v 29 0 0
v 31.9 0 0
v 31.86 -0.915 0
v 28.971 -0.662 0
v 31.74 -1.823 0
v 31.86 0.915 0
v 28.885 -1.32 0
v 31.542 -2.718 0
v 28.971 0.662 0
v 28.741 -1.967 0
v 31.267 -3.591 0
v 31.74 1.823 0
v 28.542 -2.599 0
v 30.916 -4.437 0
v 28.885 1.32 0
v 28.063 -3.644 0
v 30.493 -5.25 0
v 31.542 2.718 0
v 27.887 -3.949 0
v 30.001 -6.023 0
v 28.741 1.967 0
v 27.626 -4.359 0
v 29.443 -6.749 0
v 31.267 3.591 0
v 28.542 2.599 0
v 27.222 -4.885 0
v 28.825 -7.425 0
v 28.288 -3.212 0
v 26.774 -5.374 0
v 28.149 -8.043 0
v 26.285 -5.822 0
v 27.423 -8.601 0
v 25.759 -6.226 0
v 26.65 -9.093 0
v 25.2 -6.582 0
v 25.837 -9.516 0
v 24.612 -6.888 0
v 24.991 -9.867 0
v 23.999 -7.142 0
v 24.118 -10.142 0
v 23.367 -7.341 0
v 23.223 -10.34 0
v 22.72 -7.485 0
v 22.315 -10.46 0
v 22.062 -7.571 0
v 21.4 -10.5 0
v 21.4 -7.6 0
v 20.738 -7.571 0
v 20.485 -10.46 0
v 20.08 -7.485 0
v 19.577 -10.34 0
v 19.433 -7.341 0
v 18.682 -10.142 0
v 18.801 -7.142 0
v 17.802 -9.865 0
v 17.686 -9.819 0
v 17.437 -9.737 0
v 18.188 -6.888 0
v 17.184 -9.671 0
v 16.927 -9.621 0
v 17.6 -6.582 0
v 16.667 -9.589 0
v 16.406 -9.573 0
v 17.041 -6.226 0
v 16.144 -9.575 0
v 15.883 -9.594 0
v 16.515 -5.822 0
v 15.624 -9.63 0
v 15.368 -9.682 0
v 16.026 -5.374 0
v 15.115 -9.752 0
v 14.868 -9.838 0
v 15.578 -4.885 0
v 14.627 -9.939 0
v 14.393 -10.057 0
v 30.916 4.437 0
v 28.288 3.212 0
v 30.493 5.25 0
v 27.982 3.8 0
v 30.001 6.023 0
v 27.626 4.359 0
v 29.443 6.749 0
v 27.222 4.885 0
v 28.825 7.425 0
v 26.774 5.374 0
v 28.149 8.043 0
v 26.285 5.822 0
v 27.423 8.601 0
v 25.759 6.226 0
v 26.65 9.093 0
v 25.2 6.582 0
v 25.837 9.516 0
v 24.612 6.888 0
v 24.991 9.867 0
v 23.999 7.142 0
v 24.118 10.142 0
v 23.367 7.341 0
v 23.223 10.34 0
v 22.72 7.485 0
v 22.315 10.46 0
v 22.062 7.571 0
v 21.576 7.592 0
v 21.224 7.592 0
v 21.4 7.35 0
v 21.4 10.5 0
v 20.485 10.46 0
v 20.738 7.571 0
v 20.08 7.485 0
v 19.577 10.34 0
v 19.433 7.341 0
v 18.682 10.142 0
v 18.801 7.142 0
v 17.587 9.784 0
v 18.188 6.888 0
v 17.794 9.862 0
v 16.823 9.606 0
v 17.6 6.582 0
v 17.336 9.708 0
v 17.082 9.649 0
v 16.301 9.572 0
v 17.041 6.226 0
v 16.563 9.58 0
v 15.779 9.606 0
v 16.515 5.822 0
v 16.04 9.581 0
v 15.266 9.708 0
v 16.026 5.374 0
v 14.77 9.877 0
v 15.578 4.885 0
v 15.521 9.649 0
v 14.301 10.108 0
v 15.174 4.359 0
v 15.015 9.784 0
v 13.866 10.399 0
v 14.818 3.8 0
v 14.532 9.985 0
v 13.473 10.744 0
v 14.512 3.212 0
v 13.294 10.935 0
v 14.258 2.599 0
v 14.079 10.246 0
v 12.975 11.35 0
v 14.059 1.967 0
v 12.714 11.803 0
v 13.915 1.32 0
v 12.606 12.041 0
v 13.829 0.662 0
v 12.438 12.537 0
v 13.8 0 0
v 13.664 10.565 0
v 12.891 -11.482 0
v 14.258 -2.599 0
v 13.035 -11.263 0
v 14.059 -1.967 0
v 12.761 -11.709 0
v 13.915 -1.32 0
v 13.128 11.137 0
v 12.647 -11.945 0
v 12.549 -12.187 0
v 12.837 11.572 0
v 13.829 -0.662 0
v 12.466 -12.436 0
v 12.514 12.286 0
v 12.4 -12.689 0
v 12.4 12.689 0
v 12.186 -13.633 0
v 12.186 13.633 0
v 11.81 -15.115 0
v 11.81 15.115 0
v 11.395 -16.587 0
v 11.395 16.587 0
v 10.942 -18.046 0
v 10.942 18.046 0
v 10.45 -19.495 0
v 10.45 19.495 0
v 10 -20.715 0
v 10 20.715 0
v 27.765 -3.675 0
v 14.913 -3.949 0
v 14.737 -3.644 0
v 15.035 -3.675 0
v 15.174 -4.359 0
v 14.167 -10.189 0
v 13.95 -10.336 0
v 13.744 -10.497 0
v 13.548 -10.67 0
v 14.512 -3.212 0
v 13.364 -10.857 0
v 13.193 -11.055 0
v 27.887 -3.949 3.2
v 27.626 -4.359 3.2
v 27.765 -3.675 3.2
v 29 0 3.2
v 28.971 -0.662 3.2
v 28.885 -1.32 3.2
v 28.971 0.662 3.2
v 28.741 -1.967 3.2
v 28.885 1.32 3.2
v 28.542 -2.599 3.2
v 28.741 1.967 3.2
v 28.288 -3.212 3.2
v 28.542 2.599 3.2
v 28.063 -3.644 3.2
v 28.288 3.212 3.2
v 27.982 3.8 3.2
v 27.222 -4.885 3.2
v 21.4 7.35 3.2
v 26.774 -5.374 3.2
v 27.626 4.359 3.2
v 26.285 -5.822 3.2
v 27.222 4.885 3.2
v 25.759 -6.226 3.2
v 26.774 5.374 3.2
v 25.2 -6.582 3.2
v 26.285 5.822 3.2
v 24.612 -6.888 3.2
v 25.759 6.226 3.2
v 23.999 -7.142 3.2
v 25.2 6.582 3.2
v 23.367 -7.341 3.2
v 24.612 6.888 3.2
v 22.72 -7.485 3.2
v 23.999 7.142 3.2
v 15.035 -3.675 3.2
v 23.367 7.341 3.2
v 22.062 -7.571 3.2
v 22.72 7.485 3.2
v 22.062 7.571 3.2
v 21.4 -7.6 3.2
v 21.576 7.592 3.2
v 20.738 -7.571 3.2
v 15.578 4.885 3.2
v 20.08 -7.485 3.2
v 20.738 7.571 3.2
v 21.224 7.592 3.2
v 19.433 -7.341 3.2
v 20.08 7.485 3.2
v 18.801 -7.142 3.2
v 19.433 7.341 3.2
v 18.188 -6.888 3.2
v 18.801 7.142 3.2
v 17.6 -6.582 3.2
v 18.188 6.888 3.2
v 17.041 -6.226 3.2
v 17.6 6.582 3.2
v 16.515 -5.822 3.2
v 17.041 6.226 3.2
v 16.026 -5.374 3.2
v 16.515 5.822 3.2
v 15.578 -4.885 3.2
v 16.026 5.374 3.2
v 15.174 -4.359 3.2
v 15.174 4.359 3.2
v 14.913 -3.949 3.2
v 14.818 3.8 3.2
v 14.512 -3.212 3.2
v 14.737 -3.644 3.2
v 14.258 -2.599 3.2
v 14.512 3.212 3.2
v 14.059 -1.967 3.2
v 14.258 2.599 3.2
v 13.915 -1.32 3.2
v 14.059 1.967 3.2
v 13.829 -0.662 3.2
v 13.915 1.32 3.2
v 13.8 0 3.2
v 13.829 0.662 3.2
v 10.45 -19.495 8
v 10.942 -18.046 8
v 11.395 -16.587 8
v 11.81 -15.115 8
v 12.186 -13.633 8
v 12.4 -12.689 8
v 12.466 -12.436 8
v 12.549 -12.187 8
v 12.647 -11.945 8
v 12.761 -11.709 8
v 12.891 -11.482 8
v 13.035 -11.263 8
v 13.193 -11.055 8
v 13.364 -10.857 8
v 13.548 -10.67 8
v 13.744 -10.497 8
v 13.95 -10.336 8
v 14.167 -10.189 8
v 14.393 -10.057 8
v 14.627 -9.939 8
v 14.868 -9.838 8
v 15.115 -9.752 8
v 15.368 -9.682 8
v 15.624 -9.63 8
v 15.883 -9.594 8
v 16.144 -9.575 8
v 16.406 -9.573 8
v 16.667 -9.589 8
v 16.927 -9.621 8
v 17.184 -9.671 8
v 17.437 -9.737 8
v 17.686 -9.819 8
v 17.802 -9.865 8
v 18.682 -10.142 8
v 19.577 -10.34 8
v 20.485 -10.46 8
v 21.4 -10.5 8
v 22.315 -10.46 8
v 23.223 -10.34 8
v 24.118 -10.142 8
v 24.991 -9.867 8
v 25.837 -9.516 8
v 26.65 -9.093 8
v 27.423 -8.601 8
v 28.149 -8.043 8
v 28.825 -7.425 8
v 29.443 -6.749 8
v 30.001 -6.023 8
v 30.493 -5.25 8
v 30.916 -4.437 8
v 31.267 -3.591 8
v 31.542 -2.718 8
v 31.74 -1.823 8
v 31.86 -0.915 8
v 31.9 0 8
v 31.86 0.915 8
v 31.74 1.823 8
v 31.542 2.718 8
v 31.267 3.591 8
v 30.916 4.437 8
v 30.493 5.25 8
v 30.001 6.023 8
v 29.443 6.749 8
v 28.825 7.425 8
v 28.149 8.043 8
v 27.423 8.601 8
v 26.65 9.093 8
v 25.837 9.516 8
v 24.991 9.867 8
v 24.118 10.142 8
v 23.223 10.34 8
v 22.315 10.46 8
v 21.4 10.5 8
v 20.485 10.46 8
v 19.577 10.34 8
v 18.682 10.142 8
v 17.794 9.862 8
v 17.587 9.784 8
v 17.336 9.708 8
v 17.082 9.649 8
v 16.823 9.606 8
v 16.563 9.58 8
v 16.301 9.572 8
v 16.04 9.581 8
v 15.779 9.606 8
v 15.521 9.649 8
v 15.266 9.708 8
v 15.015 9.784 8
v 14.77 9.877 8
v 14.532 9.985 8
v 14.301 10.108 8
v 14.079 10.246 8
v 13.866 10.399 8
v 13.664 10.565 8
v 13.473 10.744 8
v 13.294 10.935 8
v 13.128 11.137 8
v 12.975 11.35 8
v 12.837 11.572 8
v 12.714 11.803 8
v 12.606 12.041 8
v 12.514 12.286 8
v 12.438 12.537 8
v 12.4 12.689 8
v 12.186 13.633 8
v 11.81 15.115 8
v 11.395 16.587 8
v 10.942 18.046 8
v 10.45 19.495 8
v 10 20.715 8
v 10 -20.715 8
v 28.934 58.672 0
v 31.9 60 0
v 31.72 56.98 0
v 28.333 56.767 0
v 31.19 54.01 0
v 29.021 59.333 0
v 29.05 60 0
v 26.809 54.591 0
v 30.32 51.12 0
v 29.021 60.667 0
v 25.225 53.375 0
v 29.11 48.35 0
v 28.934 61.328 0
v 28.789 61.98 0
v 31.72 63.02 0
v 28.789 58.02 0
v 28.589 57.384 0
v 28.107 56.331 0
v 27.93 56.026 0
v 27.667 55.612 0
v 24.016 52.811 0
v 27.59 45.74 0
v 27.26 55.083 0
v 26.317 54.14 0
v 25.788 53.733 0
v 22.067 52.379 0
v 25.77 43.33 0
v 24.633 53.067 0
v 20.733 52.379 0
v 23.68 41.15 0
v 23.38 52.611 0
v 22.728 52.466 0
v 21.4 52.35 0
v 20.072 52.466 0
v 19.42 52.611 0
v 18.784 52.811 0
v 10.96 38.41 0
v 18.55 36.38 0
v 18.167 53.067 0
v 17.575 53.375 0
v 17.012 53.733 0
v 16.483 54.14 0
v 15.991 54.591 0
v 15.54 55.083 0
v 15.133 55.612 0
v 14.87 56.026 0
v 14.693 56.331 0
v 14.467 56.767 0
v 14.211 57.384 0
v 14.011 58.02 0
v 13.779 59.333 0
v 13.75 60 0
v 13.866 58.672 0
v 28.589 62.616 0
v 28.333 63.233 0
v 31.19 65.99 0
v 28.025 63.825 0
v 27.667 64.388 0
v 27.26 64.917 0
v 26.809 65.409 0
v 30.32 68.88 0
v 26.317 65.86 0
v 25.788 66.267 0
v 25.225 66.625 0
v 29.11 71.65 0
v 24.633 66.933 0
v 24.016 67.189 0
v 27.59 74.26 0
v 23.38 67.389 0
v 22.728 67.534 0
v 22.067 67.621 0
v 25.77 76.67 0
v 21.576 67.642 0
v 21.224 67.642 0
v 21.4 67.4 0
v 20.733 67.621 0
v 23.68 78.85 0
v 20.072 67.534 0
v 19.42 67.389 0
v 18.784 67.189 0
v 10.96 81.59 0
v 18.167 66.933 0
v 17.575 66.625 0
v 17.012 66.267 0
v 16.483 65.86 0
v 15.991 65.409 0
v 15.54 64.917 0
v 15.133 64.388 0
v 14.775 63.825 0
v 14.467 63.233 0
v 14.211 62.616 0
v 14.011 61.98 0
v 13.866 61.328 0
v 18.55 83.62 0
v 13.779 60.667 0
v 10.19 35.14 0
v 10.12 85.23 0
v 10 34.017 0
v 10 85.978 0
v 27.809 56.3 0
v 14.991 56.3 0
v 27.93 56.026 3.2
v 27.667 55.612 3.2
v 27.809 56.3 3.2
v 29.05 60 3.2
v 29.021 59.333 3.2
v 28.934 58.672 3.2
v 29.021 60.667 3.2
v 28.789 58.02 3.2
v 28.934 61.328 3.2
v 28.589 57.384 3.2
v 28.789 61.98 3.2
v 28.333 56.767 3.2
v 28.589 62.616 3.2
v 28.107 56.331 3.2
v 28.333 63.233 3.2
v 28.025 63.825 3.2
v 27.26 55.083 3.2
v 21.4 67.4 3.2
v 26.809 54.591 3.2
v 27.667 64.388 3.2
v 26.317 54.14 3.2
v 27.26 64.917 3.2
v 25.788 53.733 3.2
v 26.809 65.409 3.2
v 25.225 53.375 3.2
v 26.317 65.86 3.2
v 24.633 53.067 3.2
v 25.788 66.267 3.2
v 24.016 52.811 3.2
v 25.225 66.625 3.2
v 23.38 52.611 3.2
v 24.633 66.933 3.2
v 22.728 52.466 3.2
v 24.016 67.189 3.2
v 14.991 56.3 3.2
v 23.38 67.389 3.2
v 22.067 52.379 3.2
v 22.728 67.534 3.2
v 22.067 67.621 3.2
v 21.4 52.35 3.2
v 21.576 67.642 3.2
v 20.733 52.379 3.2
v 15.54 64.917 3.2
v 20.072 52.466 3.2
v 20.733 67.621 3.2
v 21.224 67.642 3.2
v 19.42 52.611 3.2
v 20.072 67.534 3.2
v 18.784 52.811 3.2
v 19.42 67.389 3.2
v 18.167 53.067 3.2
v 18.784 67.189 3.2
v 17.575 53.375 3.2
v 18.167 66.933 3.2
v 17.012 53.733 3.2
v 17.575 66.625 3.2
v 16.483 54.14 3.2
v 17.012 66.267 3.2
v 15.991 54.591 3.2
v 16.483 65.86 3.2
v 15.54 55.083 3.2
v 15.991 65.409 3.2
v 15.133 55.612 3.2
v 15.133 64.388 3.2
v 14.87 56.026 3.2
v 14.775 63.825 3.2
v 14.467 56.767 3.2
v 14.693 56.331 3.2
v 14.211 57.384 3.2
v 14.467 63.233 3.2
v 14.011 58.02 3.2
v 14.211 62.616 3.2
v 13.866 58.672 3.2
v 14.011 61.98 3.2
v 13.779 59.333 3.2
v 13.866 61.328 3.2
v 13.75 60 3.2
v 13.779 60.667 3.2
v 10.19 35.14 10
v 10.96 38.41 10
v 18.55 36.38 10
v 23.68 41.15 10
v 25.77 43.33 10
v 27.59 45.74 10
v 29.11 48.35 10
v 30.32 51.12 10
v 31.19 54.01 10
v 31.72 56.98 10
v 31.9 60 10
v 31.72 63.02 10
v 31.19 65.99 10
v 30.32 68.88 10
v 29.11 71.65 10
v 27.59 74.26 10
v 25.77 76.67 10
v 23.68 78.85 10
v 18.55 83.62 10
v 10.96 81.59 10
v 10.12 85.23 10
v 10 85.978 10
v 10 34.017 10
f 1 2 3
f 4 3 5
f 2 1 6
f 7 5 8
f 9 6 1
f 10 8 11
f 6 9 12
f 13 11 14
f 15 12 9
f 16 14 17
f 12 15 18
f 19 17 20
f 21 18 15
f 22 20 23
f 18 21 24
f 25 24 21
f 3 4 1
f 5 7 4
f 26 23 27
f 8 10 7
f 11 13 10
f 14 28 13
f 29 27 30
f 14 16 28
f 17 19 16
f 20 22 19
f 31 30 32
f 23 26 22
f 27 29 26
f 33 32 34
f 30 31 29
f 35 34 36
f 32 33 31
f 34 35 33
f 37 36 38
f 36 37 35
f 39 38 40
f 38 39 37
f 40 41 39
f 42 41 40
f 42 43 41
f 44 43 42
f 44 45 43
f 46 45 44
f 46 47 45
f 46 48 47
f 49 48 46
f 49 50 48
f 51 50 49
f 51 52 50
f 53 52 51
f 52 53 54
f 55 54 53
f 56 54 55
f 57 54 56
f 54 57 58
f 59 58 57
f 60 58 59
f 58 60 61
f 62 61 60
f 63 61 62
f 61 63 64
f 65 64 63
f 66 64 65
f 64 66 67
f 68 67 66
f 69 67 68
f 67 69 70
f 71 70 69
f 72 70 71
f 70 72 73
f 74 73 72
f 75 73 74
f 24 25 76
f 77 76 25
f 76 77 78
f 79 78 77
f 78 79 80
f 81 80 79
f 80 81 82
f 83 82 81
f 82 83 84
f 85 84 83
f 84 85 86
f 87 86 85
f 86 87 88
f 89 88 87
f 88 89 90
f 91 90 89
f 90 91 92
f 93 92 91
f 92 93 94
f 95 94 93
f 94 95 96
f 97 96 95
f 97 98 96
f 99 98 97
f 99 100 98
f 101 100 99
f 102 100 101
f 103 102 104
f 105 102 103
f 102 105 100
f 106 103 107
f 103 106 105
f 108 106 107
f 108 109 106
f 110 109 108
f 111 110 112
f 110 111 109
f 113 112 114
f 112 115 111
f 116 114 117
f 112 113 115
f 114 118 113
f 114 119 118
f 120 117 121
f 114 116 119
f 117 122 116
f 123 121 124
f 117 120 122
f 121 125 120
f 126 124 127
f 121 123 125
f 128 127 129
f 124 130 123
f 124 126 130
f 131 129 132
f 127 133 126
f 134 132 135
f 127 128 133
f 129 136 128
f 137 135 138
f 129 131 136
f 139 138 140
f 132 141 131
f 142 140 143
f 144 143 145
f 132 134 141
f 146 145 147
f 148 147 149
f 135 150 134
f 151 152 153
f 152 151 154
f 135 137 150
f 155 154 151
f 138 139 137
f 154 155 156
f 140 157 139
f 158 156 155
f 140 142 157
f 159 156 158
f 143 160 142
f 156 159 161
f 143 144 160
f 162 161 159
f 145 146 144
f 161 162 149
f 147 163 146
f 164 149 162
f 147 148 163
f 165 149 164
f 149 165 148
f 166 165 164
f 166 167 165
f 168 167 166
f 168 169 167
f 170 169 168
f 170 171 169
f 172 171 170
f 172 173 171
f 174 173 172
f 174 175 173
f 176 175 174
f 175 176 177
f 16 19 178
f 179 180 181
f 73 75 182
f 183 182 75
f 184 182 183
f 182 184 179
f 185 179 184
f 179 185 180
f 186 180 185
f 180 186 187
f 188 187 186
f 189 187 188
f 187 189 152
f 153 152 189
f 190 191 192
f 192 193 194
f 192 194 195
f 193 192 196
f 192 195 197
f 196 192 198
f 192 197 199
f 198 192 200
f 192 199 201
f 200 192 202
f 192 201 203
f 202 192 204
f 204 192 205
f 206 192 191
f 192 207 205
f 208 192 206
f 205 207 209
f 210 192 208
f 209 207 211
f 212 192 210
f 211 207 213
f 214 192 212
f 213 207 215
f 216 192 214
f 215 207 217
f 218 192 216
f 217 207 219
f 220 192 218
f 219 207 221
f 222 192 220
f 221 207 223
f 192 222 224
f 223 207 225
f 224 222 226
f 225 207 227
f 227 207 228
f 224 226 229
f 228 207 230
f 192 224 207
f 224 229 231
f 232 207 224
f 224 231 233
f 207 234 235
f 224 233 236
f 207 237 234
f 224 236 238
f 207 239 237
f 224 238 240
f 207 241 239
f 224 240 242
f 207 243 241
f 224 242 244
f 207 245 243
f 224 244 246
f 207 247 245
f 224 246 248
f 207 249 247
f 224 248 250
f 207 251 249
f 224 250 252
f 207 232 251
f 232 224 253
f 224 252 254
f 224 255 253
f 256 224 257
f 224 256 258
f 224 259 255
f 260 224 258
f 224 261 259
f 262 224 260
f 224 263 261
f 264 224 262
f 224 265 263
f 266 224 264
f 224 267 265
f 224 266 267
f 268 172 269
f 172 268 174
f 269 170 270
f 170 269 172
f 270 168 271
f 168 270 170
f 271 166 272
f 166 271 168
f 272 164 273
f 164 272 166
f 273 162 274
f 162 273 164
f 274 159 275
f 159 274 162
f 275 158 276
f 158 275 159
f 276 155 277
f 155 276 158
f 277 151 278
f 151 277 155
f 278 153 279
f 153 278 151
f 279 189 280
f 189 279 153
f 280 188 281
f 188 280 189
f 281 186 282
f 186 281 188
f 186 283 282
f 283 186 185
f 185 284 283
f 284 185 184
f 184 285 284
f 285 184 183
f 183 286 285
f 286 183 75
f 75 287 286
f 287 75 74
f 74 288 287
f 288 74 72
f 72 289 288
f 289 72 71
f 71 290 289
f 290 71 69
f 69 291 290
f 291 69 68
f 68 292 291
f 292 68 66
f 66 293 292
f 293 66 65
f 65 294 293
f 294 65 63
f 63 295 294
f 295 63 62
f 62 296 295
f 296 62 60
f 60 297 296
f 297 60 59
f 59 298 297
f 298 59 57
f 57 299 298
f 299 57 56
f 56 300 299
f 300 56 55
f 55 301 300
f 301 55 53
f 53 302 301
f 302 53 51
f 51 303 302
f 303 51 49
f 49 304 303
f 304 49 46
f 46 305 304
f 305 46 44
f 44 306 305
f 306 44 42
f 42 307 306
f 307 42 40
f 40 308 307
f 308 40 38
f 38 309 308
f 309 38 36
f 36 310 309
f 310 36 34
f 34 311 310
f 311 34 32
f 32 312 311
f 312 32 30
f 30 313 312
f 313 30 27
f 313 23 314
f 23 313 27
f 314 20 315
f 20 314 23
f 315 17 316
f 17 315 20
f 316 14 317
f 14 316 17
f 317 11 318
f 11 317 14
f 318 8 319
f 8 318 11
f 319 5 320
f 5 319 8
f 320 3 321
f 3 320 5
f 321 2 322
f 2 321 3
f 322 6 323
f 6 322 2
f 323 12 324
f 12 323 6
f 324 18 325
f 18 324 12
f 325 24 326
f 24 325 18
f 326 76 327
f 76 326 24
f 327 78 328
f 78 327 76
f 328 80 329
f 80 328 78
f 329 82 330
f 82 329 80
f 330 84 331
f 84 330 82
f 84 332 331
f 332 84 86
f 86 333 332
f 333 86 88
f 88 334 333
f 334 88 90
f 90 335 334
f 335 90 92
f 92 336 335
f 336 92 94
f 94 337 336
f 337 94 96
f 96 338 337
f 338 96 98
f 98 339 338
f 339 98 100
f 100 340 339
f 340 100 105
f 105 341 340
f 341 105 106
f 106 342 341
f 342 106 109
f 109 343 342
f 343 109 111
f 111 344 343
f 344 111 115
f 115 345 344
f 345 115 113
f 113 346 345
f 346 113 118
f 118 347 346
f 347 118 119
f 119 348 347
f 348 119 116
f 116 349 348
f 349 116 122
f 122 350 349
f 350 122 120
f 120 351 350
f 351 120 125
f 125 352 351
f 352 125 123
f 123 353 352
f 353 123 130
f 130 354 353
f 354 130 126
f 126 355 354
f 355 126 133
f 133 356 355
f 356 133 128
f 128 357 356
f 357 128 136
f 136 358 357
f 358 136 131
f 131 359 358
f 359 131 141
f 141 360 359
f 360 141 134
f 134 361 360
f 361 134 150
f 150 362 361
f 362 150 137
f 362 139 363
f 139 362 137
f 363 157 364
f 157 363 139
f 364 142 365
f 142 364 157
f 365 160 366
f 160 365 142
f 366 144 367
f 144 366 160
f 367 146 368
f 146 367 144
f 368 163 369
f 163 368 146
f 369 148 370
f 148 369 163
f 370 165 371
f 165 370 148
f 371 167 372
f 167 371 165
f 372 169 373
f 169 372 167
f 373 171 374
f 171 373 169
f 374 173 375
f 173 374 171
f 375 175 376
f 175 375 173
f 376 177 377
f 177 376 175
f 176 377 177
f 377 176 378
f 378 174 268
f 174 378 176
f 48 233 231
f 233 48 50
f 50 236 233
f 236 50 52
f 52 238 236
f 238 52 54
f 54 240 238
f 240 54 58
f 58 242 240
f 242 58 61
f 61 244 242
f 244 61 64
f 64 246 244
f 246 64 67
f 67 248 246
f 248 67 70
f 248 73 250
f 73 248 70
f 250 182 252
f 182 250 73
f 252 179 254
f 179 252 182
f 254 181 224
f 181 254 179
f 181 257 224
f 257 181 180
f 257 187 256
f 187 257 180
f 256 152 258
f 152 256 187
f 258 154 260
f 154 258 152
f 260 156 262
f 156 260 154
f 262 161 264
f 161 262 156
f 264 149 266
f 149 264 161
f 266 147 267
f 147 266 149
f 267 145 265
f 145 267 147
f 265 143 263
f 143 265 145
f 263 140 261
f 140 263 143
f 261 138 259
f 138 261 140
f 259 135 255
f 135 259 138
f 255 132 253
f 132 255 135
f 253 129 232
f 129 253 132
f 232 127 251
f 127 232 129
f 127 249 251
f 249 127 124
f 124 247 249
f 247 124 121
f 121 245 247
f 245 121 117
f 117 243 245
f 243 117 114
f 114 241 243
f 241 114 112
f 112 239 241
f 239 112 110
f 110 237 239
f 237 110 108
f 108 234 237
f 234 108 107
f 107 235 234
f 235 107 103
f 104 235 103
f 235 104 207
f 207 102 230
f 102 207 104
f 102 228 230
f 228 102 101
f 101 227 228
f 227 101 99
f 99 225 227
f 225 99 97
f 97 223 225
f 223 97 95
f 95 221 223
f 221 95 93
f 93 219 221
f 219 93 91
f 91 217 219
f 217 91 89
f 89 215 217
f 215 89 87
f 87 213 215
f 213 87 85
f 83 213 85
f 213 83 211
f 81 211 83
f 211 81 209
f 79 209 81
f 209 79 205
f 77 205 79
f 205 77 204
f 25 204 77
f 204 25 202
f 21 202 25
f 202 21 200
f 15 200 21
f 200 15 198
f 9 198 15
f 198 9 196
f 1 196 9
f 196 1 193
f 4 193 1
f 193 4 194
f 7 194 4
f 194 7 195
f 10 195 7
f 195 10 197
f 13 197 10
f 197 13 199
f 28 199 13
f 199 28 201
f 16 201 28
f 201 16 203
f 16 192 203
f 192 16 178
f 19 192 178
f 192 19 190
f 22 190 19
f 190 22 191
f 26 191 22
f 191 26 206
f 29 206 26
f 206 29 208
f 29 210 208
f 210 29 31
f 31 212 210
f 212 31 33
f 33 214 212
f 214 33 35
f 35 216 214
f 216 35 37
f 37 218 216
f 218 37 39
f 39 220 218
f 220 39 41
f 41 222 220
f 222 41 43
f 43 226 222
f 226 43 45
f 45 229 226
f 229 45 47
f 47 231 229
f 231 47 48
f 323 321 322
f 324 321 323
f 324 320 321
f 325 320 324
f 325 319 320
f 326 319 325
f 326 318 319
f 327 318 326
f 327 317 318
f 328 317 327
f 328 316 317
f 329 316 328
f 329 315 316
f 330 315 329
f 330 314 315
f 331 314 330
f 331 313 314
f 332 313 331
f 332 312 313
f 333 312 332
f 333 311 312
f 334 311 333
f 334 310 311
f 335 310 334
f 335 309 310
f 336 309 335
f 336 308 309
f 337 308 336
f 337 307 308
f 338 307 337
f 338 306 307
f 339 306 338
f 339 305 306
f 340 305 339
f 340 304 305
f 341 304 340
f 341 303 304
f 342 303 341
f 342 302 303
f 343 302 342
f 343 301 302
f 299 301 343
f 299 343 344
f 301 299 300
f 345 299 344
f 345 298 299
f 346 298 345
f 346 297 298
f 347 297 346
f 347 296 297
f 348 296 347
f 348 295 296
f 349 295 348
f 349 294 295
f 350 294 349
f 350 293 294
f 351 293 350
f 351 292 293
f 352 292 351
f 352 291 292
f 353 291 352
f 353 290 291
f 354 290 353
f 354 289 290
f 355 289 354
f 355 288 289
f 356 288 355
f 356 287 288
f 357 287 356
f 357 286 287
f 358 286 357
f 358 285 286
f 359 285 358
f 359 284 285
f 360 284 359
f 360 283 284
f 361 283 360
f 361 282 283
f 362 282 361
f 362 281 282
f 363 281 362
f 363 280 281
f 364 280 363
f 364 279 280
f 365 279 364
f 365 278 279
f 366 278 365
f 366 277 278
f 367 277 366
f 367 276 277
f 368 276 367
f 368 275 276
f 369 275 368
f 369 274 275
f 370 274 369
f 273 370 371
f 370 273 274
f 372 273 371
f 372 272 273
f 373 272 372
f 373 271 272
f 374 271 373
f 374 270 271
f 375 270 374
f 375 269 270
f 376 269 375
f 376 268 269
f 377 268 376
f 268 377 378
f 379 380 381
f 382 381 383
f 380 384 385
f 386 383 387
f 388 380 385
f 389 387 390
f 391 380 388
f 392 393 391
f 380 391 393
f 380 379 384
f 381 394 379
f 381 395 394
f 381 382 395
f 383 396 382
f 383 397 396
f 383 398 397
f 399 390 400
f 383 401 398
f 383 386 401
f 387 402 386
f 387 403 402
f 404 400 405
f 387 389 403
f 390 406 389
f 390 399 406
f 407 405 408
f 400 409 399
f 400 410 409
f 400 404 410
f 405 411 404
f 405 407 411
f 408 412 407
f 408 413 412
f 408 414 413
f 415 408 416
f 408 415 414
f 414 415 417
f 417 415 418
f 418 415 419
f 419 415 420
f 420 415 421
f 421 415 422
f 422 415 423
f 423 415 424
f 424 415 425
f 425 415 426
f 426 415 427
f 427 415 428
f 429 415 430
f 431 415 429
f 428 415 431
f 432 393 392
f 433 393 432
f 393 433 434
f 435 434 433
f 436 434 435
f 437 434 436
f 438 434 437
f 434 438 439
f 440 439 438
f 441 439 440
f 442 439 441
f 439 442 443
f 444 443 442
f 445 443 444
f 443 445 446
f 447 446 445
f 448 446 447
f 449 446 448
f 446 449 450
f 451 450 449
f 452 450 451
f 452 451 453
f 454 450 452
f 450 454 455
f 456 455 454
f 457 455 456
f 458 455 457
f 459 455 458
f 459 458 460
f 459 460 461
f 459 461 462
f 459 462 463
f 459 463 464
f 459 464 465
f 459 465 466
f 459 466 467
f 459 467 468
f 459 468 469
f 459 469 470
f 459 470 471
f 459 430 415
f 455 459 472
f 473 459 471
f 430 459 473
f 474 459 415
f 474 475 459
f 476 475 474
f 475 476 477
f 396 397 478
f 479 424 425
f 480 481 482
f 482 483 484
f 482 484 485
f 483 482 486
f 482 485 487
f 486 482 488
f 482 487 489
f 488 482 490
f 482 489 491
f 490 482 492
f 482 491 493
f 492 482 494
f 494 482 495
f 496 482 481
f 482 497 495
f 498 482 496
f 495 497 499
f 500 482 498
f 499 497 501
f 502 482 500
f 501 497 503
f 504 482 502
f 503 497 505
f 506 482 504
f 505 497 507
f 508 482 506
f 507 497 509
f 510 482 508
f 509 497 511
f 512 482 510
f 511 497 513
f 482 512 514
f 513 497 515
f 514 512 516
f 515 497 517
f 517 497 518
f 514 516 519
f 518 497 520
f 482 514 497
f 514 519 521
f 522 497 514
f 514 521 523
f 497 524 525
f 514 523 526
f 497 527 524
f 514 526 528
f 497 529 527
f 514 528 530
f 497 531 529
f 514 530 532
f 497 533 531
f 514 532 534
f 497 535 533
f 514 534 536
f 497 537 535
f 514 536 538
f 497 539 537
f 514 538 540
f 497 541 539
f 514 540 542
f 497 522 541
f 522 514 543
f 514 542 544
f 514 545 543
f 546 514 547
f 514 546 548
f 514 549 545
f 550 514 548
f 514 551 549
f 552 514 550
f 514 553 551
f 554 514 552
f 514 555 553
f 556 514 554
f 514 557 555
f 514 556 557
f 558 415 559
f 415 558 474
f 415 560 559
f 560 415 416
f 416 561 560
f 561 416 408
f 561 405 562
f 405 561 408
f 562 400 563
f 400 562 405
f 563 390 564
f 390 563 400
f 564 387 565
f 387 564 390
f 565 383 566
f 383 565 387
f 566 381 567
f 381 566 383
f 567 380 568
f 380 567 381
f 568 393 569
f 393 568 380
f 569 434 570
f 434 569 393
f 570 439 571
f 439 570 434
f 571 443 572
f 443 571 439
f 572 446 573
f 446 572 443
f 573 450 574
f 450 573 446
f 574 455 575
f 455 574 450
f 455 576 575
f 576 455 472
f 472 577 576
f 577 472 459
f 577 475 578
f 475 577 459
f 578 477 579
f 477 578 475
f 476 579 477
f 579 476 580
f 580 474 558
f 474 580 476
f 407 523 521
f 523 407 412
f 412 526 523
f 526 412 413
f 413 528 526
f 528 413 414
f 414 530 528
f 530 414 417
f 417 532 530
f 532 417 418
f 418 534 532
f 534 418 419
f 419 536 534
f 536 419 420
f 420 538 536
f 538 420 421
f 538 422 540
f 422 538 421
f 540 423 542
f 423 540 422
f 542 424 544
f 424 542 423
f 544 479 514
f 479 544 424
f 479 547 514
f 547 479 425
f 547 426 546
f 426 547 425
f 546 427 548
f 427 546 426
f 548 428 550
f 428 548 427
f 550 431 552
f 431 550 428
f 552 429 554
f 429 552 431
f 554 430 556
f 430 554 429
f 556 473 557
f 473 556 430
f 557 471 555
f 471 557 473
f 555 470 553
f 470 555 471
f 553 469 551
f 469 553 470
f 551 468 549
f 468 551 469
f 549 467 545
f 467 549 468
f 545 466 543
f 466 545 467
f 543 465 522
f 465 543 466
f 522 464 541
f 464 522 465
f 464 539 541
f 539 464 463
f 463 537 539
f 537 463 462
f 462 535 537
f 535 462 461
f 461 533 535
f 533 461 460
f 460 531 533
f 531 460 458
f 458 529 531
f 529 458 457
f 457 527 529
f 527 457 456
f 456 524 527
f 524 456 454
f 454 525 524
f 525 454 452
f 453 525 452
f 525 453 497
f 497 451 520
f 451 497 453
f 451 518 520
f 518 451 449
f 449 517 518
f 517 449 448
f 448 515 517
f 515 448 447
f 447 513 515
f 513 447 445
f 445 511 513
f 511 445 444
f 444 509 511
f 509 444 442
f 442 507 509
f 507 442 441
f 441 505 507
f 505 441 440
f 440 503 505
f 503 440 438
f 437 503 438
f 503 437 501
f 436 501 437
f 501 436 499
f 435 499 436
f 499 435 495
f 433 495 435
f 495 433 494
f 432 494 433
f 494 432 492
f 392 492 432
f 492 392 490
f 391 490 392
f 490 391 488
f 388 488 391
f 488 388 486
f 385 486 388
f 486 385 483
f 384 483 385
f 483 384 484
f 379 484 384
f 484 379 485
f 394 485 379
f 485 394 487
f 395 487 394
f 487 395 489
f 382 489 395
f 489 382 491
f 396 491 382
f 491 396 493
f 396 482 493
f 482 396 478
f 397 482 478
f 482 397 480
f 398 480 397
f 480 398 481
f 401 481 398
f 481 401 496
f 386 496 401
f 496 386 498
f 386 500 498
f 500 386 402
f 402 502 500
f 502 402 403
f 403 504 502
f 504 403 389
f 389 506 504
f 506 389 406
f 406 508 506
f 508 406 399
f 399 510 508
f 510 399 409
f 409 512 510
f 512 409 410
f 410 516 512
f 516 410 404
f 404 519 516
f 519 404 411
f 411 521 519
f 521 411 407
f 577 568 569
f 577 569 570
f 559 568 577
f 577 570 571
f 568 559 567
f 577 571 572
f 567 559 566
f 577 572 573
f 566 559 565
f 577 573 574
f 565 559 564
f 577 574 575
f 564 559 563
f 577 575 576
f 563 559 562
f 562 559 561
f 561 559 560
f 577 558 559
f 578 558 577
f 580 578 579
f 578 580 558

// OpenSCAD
// =====================================================================
//  Ersatz-Fuss (Magnetlappen) fuer die Magnetflaechen des Abluft-Systems.   OpenSCAD 2021.01 oder neuer.
//  Zweck: ein Lappen ("Fuss") wurde mit verpoltem Magnet bestueckt -> Lappen absaegen und diesen Ersatz ankleben.
//  Der Fuss ist ein Lappen samt Randsegment (Umriss exakt wie am Flansch) mit Magnettasche, in Druckrichtung
//  modelliert (Magnetflaeche z=0 unten). Koordinaten wie am Flansch: Flanschmitte im Ursprung, Lappen auf +x.
//  Die Saegekante ist eine gerade Sehne senkrecht zur Lappenrichtung im Abstand r_saege von der Flanschmitte.
//
//  Ausgabe:  fuss = "6er" | "8er" | "beide"  (beide: nebeneinander auf einer Platte)
//  Export:   werkzeuge/export_fuss.sh   ->   fuesse/fuss_6er.stl, fuesse/fuss_8er.stl
//
//  Einbau: Lappen samt Randsegment mit EINEM geraden Schnitt (Sehne, rechtwinklig zur Lappenrichtung, Abstand
//  r_saege von der Flanschmitte, ca. 40 mm lang) abtrennen. Saegestelle und Fuss plan schleifen,
//  mit Zweikomponenten-Kleber (PETG: z. B. Epoxid oder Sekundenkleber + Aktivator) fuegen, Magnet erst DANACH
//  einkleben (richtige Polung mit den Nachbarn bzw. der Gegenflaeche pruefen: Kerbe auf Kerbe stoesst ab).
// =====================================================================
include <abluft_system.scad>
part = "keiner";                     // Hauptdatei: keine Ausgabe des Systems (muss nach dem include stehen)

/* [Ausgabe] */
// fuss: welcher Fuss erzeugt wird: "6er" (Schlauchflansch 100/110), "8er" (150er Flansch) oder "beide" nebeneinander
fuss = "beide";             // ["6er", "8er", "beide"]

/* [Gemeinsame Einstellungen] */
// fuss_kerbe: Polungskerbe am Lappenrand (Dreiecksmarke wie bei den uebrigen Teilen). Nur an jedem 2. Lappen
//             vorhanden: true, wenn der ersetzte Lappen eine Kerbe hatte, sonst false
fuss_kerbe   = false;
// fuss_zugabe: Zugabe in der Saegerichtung (mm): Der Fuss ist so viel laenger, damit die Saegekante nachgeschliffen werden kann
fuss_zugabe  = 0.0;         // [0:0.5:3]
// fuss_nase: Stuetznase auf der RUECKSEITE (z = Dicke): Lasche in Richtung Flanschmitte, die ueber der Saegestelle
//            auf dem Flansch aufliegt (Klebefläche vergroessert, Fuss reisst nicht ab). 0 = keine. Achtung: steht
//            um fuss_nase_t ueber die Rueckseite; nur verwenden, wo die Rueckseite frei ist.
fuss_nase_l  = 0;           // [0:1:25]
// fuss_nase_b: Breite der Stuetznase (mm)
fuss_nase_b  = 20;          // [10:1:40]
fuss_nase_t  = 1.6;         // [0.8:0.2:3]

/* [6er Fuss: Schlauchflansch (Parameter hose_nom in abluft_system.scad)] */
// f6_dicke: Dicke des Flansches an dieser Stelle (flange110_t = 8)
f6_dicke     = flange110_t;
// f6_r_saege: Abstand des geraden Saegeschnitts (Sehne) von der Flanschmitte. Standard = Nutaussenkante + 2 mm Steg;
//             der Schnitt muss ausserhalb der Dichtungsnut bleiben und vor der Magnettasche (Rand bei R - Taschenradius) liegen
f6_r_saege   = gr110 + groove_w / 2 + 2;

/* [8er Fuss: 150er Flansch] */
// f8_dicke: Dicke des Flansches (Verjuengung/Adapter: adapter_t = 10, Durchfuehrung innen: disc_t = 12)
f8_dicke     = adapter_t;
// f8_r_saege: Abstand des geraden Saegeschnitts (Sehne) von der Flanschmitte (Standard = Nutaussenkante + 2 mm Steg)
f8_r_saege   = gr150_face + groove_w / 2 + 2;

// ---------------- Geometrie ----------------
polarity_marks = false;             // Kerbe des Systems aus (OpenSCAD wertet Zuweisungen an der ersten Stelle aus: nur Literale!); eigene Kerbe unten

// Umriss des Fusses (2D): Flanschumriss mit nur einem Lappen auf +x, begrenzt durch die gerade Saegekante x >= rs
module fuss_umriss(n, R, lr, br, rs) {
    difference() {
        intersection() {
            outline2d(n, R, lr, br, 0, true);
            translate([rs - fuss_zugabe, -200]) square([400, 400]);
        }
        if (fuss_kerbe) translate([R + lr, 0]) circle(d = 1.8, $fn = 24);   // wie outline2d des Systems
    }
}
module fuss(n, R, lr, br, rs, T, pr_) {
    // unten: mit Magnettasche (Taschentiefe), oben: massiv
    linear_extrude(height = pdepth)
        difference() { fuss_umriss(n, R, lr, br, rs); translate([R, 0]) pocket2d(pr_); }
    translate([0, 0, pdepth]) linear_extrude(height = T - pdepth) fuss_umriss(n, R, lr, br, rs);
    if (fuss_nase_l > 0)
        intersection() {
            translate([rs - fuss_zugabe - fuss_nase_l, -fuss_nase_b / 2, T]) cube([fuss_nase_l + 1, fuss_nase_b, fuss_nase_t]);
            translate([0, 0, T - 0.5]) cylinder(r = br, h = fuss_nase_t + 1, $fn = 240);
        }
}

module fuss6() { fuss(6, R110, lobe110, body110_r, f6_r_saege, f6_dicke, pr110); }
module fuss8() { fuss(8, R150, lobe150, body150, f8_r_saege, f8_dicke, pr); }

if (fuss == "6er") fuss6();
else if (fuss == "8er") fuss8();
else { translate([-f6_r_saege + 10, 0, 0]) fuss6(); translate([-f8_r_saege + 10, 60, 0]) fuss8(); }
